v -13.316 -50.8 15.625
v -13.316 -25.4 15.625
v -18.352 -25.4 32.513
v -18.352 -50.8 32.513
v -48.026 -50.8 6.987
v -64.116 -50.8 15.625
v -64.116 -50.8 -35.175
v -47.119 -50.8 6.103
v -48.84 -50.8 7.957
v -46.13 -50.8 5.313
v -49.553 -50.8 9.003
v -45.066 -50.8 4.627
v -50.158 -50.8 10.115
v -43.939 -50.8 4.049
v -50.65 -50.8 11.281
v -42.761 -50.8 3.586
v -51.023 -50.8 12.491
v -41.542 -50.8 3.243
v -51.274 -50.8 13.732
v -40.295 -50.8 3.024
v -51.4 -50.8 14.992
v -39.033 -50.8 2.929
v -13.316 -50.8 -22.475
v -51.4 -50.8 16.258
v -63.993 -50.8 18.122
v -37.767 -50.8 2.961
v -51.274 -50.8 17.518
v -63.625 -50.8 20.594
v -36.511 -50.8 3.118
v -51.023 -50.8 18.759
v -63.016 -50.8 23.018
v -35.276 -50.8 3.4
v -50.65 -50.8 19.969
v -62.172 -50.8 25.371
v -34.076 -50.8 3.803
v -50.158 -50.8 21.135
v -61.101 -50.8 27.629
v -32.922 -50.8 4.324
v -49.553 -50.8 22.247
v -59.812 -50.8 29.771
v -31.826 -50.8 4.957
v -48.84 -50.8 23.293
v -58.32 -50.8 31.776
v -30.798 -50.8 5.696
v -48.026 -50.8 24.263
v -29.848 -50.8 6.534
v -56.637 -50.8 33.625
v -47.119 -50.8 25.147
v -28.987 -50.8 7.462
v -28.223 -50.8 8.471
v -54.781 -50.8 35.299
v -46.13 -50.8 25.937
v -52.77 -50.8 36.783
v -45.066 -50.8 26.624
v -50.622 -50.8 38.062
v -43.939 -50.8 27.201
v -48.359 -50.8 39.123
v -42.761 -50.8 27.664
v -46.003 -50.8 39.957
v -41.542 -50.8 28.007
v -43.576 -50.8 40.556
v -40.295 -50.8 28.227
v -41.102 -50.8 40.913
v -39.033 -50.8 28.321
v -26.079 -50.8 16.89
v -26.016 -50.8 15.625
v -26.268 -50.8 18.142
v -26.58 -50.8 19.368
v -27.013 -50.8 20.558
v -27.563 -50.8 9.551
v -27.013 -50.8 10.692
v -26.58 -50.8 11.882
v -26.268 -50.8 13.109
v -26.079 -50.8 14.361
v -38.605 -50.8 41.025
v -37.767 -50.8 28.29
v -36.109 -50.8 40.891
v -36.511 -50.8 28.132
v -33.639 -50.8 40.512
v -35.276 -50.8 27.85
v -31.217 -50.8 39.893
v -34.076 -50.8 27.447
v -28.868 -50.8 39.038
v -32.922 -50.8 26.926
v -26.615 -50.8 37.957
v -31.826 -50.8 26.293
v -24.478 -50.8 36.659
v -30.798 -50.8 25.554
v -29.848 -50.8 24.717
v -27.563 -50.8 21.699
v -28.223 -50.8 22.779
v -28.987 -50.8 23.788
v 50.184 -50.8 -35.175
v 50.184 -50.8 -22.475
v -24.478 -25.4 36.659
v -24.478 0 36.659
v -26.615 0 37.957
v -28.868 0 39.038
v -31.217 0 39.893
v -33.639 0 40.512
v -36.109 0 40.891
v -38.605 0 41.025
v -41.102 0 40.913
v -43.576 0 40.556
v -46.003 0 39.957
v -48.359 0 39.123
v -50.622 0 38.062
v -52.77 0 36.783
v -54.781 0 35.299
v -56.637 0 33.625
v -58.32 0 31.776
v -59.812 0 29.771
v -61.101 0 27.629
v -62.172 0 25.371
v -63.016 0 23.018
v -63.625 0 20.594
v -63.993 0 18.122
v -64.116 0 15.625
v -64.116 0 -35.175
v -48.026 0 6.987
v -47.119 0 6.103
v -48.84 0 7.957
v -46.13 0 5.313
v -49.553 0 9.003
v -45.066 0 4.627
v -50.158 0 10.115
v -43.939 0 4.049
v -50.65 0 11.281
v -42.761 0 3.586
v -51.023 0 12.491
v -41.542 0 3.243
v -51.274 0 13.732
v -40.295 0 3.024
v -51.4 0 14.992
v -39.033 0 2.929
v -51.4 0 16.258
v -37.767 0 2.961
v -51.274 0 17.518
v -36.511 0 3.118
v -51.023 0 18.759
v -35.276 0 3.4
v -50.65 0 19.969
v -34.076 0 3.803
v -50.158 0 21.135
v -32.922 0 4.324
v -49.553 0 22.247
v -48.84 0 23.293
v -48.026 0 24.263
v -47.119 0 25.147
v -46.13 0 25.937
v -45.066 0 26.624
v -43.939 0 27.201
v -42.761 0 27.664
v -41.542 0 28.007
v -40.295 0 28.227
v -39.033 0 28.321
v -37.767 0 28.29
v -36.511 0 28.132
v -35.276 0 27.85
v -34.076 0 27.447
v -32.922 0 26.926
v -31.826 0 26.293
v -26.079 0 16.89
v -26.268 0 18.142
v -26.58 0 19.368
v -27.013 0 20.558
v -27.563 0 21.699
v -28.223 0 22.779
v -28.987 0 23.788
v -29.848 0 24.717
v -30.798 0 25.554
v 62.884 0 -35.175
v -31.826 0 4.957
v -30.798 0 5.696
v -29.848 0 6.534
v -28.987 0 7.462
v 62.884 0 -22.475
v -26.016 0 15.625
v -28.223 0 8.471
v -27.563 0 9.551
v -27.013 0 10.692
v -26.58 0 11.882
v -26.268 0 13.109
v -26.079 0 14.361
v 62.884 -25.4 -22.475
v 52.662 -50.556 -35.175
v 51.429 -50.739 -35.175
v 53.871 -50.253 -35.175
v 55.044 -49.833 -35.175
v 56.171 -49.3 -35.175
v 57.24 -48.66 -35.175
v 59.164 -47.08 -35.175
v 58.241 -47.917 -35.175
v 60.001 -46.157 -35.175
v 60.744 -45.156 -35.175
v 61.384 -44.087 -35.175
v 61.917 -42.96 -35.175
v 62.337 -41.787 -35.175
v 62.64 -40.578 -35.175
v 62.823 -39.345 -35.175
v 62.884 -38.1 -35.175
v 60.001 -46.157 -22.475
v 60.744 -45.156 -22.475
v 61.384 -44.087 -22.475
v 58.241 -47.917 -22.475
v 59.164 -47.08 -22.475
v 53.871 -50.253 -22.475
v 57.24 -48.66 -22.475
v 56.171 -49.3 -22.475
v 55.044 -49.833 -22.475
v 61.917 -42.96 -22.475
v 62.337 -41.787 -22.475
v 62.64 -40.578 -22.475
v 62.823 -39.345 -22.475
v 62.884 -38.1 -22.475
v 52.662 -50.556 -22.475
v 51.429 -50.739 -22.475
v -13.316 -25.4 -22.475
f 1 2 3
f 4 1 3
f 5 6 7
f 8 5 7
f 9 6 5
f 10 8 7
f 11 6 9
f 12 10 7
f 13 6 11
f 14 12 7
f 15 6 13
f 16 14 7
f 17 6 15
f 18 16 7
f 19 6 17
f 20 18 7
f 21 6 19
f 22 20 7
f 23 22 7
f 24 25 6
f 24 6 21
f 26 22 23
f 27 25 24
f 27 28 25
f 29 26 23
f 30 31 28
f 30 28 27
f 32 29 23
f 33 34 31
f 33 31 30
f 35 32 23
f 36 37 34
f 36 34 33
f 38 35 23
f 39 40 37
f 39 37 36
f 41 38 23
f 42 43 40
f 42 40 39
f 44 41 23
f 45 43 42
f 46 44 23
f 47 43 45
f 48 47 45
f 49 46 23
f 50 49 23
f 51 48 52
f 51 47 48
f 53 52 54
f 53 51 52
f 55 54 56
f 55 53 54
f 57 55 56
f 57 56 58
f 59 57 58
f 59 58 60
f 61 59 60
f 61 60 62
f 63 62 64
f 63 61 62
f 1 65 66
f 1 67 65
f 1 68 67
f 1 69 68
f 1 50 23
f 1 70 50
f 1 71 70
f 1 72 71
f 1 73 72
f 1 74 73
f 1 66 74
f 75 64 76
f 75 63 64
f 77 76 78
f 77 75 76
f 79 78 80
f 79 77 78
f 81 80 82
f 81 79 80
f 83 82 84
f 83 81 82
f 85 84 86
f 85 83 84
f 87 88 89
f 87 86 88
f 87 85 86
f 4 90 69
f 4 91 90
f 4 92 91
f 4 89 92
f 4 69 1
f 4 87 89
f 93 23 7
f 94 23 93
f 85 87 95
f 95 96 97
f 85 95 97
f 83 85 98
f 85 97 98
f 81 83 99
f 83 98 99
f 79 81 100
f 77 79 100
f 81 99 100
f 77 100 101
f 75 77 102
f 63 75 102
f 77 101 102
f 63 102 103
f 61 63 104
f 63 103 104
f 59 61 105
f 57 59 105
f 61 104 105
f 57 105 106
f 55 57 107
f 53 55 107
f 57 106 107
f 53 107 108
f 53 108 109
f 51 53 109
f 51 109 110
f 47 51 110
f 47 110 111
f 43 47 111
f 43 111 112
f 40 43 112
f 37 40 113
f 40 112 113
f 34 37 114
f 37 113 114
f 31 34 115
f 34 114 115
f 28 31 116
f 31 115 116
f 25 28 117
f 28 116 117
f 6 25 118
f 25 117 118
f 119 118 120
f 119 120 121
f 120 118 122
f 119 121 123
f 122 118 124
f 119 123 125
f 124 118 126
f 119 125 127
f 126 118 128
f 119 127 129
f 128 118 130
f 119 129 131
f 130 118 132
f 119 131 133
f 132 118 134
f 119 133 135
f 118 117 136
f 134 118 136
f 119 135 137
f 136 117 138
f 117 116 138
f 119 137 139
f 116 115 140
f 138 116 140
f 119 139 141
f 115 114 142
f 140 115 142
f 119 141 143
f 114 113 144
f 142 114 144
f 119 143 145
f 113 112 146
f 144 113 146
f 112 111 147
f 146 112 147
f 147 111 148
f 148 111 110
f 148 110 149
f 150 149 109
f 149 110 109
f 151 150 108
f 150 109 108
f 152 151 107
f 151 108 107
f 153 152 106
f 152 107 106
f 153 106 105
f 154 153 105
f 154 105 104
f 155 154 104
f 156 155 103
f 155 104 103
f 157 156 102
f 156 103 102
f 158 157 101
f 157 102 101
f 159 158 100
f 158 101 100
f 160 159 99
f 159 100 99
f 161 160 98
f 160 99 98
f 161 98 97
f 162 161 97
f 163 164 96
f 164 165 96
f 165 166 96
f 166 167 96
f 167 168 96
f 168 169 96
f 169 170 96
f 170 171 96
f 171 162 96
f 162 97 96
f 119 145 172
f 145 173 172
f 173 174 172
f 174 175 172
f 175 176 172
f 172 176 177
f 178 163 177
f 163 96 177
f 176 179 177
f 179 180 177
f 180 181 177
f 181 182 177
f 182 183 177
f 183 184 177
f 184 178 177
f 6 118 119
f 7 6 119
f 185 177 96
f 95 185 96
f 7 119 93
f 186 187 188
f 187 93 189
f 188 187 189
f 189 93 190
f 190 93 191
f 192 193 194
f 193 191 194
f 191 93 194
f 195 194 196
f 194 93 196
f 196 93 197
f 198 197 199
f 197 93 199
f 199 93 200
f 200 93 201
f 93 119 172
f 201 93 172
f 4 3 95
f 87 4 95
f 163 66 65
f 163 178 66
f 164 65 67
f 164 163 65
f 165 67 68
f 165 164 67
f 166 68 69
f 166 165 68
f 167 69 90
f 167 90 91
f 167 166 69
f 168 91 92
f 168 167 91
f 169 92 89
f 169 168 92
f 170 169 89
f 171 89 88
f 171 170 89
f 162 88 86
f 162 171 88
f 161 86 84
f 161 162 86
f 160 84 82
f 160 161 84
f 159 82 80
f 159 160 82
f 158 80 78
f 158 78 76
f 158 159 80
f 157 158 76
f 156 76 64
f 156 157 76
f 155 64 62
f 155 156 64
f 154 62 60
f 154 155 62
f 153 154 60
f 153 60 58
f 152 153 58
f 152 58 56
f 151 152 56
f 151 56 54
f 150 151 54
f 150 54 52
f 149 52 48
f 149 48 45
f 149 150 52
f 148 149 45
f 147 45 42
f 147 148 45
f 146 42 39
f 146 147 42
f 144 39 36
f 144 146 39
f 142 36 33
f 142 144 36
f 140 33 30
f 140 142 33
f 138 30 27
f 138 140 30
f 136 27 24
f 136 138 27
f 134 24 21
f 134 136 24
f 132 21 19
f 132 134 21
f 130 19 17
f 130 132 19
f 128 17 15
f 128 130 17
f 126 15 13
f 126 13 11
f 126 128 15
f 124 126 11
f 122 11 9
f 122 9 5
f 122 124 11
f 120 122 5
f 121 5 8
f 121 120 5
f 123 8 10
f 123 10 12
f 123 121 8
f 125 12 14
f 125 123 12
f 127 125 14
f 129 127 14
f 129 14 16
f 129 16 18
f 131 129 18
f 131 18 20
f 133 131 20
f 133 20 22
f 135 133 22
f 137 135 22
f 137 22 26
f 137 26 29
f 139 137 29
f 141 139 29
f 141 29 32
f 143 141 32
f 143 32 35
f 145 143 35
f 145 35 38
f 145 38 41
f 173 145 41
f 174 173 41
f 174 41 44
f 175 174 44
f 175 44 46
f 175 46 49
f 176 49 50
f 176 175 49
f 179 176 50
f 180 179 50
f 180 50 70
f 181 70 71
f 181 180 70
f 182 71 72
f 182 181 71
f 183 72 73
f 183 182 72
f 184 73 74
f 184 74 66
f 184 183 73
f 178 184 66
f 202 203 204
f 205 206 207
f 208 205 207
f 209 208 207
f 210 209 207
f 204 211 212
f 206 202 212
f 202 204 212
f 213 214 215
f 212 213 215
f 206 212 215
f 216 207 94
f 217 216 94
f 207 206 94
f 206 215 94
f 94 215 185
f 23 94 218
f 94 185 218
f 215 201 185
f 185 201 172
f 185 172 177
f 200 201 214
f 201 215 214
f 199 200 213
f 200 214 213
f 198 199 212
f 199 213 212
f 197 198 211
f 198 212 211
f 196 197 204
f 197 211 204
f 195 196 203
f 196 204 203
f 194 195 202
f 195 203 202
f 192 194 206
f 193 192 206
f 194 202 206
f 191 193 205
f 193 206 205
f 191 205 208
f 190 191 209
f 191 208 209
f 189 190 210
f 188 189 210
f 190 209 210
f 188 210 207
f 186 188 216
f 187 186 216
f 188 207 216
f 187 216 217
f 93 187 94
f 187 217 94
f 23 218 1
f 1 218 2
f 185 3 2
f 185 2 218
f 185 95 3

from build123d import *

# Parameters (mm, degrees)
F0_R     = 12.7
F1_DEPTH = 25.4
F2_R     = 12.7
F3_DEPTH = 25.4
F4_R     = 12.7


with BuildPart() as f1:
    # F0 (on Front) → F1 (new body)
    with BuildSketch(Plane.XZ):
        with BuildLine():
            Line((62.883959, -22.474932), (-24.478167, 36.659396))
            ThreePointArc((-24.478167, 36.659396), (-50.6223, 38.061667), (-64.116041, 15.625068))
            Line((-64.116041, 15.625068), (-64.116041, -35.174932))
            Line((-64.116041, -35.174932), (62.883959, -35.174932))
            Line((62.883959, -35.174932), (62.883959, -22.474932))
        make_face()
        with Locations((-38.716041, 15.625068)):
            Circle(F0_R, mode=Mode.SUBTRACT)
    extrude(amount=F1_DEPTH)

    # F2 (on face) → F3 (join)
    with BuildSketch(Plane.XZ.offset(25.4)):
        with BuildLine():
            Line((62.883959, -35.174932), (62.883959, -22.474932))
            Line((62.883959, -22.474932), (-13.316041, -22.474932))
            Line((-13.316041, -22.474932), (-13.316041, 15.625068))
            Line((-13.316041, 15.625068), (-18.351755, 32.512504))
            Line((-18.351755, 32.512504), (-24.478167, 36.659396))
            ThreePointArc((-24.478167, 36.659396), (-50.6223, 38.061667), (-64.116041, 15.625068))
            Line((-64.116041, 15.625068), (-64.116041, -22.474932))
            Line((-64.116041, -22.474932), (-64.116041, -35.174932))
            Line((-64.116041, -35.174932), (62.883959, -35.174932))
        make_face()
        with Locations((-38.716041, 15.625068)):
            Circle(F2_R, mode=Mode.SUBTRACT)
    extrude(amount=F3_DEPTH)

    # F4
    f4_edges = [f1.edges().sort_by_distance(p)[0] for p in [
        (62.883959, -50.8, -28.824932),
    ]]
    fillet(f4_edges, radius=F4_R)


solid = f1.part
